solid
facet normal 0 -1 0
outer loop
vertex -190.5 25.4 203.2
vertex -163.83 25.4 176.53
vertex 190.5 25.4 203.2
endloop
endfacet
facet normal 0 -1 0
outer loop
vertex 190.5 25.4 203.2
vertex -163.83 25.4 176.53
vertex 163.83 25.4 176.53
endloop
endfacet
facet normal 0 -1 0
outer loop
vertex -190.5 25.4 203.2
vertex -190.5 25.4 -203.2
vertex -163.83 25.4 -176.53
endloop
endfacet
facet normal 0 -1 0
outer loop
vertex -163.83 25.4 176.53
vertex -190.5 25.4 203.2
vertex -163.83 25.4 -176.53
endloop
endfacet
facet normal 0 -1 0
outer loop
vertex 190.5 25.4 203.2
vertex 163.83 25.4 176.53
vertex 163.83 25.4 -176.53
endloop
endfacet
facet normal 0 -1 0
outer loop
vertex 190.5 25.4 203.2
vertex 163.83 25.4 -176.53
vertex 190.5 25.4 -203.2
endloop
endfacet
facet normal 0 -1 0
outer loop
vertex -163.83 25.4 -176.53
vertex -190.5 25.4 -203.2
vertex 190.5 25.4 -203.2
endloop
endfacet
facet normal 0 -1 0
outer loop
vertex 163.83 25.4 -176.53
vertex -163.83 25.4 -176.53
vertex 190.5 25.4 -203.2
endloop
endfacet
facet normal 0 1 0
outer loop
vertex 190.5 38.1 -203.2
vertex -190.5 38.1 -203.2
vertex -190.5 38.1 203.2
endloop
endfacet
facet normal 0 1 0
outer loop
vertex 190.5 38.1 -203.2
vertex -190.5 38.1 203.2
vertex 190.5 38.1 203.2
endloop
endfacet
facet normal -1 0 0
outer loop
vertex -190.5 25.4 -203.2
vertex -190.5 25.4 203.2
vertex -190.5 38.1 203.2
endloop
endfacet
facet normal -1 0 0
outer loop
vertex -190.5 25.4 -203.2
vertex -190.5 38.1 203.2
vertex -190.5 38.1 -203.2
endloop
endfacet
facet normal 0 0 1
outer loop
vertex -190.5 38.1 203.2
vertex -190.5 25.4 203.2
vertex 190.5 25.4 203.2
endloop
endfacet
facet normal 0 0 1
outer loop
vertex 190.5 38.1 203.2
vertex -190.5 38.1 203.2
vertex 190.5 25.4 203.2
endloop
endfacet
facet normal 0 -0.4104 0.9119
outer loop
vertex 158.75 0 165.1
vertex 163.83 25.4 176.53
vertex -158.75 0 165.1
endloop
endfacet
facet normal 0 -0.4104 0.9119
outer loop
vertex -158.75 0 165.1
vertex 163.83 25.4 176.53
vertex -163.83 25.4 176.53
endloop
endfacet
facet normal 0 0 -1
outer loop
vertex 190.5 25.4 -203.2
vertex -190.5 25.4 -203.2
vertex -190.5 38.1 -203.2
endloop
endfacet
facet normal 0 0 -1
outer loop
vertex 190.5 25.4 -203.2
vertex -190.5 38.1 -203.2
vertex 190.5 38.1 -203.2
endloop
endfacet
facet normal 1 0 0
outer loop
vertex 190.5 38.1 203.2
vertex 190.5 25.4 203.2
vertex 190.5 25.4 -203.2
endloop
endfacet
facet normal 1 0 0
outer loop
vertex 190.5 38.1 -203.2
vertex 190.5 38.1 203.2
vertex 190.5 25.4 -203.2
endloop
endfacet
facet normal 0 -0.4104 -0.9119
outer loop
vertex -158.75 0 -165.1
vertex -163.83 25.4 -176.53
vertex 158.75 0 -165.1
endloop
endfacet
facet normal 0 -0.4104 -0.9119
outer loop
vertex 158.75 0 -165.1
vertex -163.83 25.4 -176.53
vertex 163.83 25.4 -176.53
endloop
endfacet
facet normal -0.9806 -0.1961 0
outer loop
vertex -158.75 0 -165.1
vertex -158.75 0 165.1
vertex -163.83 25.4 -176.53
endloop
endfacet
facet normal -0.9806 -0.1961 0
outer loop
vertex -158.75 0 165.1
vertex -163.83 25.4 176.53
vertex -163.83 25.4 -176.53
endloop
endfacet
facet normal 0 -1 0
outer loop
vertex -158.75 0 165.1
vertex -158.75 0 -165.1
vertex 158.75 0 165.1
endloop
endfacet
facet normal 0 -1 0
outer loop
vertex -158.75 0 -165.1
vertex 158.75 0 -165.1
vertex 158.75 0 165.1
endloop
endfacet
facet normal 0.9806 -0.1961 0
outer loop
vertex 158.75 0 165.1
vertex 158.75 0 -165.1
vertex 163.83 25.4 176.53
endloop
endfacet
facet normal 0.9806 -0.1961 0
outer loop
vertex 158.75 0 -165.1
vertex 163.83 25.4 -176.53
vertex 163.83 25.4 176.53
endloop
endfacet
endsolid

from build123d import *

# Parameters (mm, degrees)
SKETCH4_W           = 381
SKETCH4_H           = 406.4
BOSS_EXTRUDE1_DEPTH = 12.7


with BuildPart() as part:
    # Sketch1 → Loft1 section 0
    with BuildSketch(Plane(origin=(0, 0, 0), x_dir=(1, 0, 0), z_dir=(0, 1, 0))):
        with BuildLine():
            Line((-158.75, 165.1), (158.75, 165.1))
            Line((158.75, 165.1), (158.75, -165.1))
            Line((158.75, -165.1), (-158.75, -165.1))
            Line((-158.75, -165.1), (-158.75, 165.1))
        make_face()
    # Sketch2 → Loft1 section 1
    with BuildSketch(Plane(origin=(0, 25.4, 0), x_dir=(1, 0, 0), z_dir=(0, 1, 0))):
        with BuildLine():
            Line((-163.83, 176.53), (163.83, 176.53))
            Line((163.83, 176.53), (163.83, -176.53))
            Line((163.83, -176.53), (-163.83, -176.53))
            Line((-163.83, -176.53), (-163.83, 176.53))
        make_face()
    loft()

    # Sketch4 → Boss-Extrude1 (add)
    with BuildSketch(Plane(origin=(0, 25.4, 0), x_dir=(1, 0, 0), z_dir=(0, 1, 0))):
        Rectangle(SKETCH4_W, SKETCH4_H)
    extrude(amount=BOSS_EXTRUDE1_DEPTH)


solid = part.part
